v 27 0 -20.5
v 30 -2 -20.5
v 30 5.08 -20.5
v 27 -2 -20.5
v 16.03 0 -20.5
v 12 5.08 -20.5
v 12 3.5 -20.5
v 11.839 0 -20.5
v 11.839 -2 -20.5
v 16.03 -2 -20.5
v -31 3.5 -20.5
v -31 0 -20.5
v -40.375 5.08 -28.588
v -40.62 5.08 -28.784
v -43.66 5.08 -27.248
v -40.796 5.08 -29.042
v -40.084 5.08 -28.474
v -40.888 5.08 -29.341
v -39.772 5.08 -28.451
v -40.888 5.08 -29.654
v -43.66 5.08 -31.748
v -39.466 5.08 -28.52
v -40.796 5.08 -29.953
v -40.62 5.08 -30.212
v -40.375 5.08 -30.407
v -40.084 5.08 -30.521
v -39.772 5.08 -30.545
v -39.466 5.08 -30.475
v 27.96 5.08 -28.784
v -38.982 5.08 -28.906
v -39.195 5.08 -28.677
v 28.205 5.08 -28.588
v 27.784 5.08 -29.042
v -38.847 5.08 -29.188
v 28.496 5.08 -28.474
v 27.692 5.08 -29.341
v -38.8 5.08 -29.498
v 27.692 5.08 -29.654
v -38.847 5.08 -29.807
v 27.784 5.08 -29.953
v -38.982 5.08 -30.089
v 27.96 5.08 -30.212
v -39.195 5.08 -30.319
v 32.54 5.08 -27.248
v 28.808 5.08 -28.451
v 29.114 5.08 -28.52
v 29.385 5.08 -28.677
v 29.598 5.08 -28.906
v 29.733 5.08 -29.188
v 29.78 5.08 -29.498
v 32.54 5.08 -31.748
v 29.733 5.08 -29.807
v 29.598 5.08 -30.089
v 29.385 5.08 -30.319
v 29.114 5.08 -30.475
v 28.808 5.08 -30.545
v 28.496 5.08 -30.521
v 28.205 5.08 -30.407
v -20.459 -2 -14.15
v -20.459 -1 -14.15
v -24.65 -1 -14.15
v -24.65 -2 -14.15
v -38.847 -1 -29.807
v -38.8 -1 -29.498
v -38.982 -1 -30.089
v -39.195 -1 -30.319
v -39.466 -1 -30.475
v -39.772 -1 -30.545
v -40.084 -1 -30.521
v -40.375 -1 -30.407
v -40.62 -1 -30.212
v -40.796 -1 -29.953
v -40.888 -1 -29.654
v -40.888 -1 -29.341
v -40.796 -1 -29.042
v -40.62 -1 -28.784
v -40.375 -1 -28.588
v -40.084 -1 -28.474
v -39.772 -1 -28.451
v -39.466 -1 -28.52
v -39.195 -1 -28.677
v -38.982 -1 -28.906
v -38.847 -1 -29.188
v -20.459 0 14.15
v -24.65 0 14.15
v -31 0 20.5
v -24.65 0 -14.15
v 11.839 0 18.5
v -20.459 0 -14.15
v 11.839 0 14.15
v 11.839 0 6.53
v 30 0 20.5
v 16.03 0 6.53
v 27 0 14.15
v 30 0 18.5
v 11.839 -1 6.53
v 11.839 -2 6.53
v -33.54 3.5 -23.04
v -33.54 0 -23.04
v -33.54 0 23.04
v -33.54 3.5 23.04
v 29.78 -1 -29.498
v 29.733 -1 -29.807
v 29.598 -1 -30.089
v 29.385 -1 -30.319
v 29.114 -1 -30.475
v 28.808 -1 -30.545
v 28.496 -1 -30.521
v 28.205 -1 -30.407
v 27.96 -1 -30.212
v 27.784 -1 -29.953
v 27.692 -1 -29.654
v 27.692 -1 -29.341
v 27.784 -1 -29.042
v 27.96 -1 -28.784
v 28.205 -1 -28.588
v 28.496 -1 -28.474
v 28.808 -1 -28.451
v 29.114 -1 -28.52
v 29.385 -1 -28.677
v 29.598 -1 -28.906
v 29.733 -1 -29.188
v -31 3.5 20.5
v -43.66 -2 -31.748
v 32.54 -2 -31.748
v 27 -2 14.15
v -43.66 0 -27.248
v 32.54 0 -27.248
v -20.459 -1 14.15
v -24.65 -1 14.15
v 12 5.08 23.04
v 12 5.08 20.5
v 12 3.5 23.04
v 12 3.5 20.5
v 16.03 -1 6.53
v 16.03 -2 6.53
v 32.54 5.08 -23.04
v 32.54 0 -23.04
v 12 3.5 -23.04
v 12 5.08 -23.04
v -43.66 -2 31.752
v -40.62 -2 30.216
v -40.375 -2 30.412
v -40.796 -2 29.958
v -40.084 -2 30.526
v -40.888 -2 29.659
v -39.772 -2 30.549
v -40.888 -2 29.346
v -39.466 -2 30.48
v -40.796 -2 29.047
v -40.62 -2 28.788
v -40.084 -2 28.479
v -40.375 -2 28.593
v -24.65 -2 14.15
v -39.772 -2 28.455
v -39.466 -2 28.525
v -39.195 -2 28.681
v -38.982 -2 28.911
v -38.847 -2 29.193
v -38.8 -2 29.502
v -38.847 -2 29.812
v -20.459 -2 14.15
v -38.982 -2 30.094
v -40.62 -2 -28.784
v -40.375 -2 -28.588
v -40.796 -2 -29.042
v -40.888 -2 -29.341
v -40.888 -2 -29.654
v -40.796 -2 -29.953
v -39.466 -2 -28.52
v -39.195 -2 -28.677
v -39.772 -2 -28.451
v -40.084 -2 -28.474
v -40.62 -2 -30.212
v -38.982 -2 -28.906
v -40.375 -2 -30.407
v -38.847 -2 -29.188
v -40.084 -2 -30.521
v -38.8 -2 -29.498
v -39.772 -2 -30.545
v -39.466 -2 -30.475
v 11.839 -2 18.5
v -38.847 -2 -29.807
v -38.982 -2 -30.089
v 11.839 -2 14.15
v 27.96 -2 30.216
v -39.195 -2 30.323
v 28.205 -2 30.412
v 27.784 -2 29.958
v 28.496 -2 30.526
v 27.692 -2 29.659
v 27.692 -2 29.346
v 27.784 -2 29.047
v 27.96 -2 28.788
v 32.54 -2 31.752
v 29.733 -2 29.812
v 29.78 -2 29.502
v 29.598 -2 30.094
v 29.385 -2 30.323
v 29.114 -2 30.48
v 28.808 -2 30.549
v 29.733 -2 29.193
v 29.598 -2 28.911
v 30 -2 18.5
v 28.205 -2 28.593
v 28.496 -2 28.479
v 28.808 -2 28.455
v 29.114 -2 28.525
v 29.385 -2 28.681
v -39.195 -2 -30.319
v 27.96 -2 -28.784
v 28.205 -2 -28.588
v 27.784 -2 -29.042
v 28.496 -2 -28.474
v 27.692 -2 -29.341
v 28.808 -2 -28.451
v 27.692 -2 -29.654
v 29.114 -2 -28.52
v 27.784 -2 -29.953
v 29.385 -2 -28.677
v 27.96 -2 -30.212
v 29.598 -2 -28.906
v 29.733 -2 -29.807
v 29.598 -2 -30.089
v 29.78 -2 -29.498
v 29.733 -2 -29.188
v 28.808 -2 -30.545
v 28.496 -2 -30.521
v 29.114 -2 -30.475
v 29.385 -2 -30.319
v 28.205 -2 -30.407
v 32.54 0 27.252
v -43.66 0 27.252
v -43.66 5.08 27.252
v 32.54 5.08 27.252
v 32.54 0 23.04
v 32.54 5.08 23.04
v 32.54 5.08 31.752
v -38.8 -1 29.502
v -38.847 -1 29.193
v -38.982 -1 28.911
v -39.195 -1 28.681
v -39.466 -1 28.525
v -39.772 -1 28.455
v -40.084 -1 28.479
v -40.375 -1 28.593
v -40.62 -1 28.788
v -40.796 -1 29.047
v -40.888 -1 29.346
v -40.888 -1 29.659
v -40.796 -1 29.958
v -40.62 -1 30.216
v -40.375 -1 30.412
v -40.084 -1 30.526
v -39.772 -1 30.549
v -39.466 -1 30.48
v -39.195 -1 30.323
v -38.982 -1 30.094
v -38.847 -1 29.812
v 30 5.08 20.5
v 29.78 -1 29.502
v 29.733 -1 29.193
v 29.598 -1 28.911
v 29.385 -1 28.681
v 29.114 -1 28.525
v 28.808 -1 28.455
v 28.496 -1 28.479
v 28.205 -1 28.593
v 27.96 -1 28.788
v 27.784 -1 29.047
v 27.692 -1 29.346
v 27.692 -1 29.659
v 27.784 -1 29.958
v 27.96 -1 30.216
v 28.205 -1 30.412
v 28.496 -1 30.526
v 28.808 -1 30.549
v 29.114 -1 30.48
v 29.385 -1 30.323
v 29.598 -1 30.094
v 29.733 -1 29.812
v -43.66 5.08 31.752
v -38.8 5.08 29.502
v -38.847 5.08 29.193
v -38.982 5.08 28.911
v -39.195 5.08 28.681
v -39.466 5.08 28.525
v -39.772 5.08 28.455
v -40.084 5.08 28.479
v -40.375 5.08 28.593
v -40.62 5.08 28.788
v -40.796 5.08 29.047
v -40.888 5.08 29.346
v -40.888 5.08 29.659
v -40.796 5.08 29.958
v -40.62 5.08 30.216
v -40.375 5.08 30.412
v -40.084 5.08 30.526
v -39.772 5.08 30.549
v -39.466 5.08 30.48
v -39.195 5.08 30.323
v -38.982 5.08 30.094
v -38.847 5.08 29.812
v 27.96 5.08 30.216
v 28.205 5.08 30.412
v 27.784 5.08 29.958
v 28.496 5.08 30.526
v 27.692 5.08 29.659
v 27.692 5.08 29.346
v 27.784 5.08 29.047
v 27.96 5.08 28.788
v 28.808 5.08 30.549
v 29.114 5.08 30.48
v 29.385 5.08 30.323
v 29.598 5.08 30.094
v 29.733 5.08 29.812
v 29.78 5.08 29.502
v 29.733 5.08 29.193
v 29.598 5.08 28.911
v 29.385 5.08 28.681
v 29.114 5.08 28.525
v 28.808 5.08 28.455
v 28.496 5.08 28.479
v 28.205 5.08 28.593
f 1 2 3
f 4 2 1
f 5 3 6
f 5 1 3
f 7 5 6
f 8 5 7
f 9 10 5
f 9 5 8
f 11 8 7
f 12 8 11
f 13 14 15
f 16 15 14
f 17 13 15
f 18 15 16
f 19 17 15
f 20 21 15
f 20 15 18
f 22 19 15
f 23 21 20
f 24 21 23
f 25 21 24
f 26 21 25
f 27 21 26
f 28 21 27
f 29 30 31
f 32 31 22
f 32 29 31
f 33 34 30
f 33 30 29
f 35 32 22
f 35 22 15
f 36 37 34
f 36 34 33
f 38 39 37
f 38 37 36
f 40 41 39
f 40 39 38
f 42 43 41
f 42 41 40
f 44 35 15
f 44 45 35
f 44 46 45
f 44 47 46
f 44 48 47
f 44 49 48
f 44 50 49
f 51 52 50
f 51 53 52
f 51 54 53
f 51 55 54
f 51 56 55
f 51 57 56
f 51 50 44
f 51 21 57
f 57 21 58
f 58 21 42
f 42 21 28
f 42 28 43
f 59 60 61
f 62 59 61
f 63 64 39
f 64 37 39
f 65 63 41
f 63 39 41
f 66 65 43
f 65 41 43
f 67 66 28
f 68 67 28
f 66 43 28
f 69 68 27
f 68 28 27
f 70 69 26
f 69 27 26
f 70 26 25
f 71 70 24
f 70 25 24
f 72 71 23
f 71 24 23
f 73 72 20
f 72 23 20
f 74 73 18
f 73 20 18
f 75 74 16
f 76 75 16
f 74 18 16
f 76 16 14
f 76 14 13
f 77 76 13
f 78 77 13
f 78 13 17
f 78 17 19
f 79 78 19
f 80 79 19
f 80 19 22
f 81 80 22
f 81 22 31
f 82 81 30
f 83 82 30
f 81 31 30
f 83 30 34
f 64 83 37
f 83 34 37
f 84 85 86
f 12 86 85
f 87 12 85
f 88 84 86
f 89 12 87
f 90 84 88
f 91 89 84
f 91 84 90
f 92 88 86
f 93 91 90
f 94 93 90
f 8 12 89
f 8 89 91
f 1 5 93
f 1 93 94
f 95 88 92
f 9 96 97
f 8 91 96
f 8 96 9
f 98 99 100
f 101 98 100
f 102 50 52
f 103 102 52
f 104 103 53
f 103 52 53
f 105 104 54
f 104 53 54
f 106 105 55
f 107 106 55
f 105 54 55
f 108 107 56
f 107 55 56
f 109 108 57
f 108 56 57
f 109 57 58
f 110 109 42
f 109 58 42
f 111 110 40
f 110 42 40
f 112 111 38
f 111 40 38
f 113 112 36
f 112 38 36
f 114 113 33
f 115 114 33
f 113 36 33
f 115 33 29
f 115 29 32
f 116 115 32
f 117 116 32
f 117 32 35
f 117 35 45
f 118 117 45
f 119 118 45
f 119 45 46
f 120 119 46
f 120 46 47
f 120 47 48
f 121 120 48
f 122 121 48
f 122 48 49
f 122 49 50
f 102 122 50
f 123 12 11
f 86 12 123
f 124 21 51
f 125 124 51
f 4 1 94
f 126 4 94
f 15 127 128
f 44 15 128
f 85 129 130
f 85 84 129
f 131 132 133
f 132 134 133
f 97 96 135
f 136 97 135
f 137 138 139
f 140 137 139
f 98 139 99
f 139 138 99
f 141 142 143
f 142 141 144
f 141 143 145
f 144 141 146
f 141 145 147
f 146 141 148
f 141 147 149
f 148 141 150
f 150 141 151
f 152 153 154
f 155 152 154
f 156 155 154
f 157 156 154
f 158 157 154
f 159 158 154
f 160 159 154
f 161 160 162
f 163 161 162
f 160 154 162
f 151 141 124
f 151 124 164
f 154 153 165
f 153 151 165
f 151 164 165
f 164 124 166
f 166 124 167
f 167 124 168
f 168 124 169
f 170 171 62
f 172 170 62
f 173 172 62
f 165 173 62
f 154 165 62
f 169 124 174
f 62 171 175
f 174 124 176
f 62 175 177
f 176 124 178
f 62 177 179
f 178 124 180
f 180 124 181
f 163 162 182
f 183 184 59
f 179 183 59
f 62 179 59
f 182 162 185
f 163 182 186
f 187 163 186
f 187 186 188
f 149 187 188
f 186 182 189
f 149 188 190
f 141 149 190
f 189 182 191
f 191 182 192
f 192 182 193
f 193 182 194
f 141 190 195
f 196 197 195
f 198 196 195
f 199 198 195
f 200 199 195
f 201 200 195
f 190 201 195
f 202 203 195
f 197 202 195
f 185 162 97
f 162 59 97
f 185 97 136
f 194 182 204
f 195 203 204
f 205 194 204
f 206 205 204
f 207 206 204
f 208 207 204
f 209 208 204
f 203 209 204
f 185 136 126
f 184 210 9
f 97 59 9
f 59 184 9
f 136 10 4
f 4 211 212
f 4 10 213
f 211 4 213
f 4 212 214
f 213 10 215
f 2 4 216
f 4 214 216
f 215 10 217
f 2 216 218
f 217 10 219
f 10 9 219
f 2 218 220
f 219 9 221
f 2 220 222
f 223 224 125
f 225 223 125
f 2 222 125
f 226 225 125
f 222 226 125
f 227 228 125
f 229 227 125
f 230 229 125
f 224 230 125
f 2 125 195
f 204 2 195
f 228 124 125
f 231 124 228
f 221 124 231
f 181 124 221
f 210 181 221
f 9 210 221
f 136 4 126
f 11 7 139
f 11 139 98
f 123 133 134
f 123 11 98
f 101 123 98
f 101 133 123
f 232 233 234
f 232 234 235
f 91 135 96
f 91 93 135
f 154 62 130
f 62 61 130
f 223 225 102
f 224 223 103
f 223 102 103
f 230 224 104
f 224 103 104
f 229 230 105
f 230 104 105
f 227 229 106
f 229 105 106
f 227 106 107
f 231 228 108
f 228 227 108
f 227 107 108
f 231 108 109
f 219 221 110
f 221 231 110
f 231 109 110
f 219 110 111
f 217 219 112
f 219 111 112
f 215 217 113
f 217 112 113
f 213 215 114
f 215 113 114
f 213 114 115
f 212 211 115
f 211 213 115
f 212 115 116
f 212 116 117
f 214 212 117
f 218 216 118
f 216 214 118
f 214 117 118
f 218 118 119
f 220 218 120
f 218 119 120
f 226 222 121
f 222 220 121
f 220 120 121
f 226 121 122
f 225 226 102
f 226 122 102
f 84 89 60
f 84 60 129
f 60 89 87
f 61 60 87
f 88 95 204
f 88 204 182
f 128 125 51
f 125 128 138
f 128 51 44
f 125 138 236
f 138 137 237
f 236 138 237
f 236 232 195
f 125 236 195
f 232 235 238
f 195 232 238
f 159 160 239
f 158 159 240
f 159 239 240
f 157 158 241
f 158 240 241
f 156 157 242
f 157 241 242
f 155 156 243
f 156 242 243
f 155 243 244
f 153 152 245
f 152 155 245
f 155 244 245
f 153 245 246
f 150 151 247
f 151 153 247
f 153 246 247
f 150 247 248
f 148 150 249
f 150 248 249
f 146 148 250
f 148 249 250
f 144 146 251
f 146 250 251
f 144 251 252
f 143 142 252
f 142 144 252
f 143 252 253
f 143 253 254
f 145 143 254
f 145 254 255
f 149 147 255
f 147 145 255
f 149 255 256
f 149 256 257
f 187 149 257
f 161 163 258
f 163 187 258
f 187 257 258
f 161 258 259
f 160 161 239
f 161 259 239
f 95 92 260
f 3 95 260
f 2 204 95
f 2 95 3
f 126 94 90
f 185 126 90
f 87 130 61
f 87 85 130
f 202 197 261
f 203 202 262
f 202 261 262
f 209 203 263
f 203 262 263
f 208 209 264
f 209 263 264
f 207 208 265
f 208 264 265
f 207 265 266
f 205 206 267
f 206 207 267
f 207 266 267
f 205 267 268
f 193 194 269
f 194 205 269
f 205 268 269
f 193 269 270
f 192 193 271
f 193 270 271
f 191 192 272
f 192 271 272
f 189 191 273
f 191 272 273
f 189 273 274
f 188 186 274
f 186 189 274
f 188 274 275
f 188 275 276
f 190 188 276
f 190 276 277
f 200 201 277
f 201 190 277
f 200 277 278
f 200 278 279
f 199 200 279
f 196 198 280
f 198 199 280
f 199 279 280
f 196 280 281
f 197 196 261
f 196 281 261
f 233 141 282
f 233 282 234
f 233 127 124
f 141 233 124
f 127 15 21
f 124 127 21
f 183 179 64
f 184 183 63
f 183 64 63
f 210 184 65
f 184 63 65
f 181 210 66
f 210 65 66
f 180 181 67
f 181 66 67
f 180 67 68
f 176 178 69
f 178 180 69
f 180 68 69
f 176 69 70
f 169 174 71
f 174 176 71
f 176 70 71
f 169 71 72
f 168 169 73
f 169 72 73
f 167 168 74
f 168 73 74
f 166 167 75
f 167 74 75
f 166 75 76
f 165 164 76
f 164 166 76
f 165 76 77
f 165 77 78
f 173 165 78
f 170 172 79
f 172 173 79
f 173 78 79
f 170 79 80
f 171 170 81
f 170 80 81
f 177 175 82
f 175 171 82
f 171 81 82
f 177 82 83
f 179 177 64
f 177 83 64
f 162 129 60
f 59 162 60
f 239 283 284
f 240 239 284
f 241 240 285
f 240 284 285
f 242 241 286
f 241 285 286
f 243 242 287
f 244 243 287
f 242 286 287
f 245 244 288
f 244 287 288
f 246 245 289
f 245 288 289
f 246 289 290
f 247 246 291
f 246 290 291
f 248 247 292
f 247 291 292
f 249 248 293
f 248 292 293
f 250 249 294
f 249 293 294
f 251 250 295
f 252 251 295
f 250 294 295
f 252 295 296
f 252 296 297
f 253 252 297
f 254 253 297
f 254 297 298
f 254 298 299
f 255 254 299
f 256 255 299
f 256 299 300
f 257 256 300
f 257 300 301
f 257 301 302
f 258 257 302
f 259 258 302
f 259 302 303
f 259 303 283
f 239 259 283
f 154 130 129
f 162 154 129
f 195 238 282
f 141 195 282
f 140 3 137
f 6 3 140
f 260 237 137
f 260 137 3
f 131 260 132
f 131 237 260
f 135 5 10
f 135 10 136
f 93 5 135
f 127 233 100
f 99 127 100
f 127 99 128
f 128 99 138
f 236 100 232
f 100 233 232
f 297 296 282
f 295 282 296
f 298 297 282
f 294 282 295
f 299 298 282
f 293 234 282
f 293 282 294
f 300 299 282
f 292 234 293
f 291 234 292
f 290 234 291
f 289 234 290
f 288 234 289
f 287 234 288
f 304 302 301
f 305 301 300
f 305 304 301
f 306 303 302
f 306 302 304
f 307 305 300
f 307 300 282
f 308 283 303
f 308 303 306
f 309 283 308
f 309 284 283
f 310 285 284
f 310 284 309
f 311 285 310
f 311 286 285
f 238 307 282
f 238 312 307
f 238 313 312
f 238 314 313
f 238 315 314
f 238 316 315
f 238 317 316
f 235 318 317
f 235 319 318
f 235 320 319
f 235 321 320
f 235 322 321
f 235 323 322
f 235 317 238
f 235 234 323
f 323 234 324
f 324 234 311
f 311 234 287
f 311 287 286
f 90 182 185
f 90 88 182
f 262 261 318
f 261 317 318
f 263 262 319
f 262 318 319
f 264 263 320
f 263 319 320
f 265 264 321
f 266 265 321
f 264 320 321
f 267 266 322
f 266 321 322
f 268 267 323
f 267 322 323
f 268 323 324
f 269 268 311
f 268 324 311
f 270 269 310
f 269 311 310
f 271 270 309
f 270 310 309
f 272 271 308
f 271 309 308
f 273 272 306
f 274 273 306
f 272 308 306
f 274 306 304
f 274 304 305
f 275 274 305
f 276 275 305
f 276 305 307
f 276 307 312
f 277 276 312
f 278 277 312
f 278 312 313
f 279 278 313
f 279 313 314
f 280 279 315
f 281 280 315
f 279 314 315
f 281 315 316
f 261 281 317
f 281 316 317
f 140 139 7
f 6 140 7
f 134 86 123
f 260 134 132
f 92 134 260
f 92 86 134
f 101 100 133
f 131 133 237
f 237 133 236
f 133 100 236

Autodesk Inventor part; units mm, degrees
ref_plane "YZ Plane" through (0, 0, 0) normal (1, 0, 0) x (0, 1, 0)
ref_plane "XZ Plane" through (0, 0, 0) normal (0, 1, 0) x (-1, 0, 0)
ref_plane "XY Plane" through (0, 0, 0) normal (0, 0, 1) x (1, 0, 0)
sketch "Sketch1" plane through (0, 0, 0) normal (0, 1, 0) x (-1, 0, 0)
  line L0 (31, 20.5) -> (-30, 20.5)
  line L1 (-30, 20.5) -> (-30, -20.5)
  line L2 (-30, -20.5) -> (31, -20.5)
  line L3 (31, -20.5) -> (31, 20.5)
  line L4 (33.54, 23.04) -> (-32.54, 23.04)
  line L5 (-32.54, 23.04) -> (-32.54, -23.04)
  line L6 (-32.54, -23.04) -> (33.54, -23.04)
  line L7 (33.54, -23.04) -> (33.54, 23.04)
  line L8 (-12, -20.5) -> (-12, 20.5)
  line L9 (-12, -23.04) -> (-12, -20.5)
  line L10 (-12, 20.5) -> (-12, 23.04)
  point P0 (0, 0)
  dimension "d0" = 41
  dimension "d1" = 61
  dimension "d2" = 20.5
  dimension "d3" = 31
  dimension "d4" = 2.54
  dimension "d9" = 18
  dimension "d48" = 46.08
extrude "Extrusion1" add sketch "Sketch1" along normal blind 3.5 contours L0 L10 L4 L7 L6 L9 L2 L3
extrude "Extrusion3" add sketch "Sketch1" along normal blind 5.08 contours L0 L1 L2 L9 L6 L5 L4 L10
sketch "Sketch3" plane through (0, 0, 0) normal (0, -1, 0) x (1, 0, 0)
  line L0 (-31, -20.5) -> (30, -20.5) projected
  line L1 (-31, 20.5) -> (-31, -20.5) projected
  line L2 (30, 20.5) -> (-31, 20.5) projected
  line L3 (30, -20.5) -> (30, 20.5) projected
  line L4 (32.54, -23.04) -> (-33.54, -23.04) projected
  line L5 (32.54, 23.04) -> (32.54, -23.04) projected
  line L6 (-33.54, 23.04) -> (32.54, 23.04) projected
  line L7 (-33.54, -23.04) -> (-33.54, 23.04) projected
  point P0 (0, 0)
extrude "Extrusion4" add sketch "Sketch3" along normal blind 1 contours L1 L2 L3 L0 | L4 L7 L6 L5
sketch "Sketch4" plane through (0, 0, 0) normal (0, 1, 0) x (1, 0, 0)
  line L0 (12, -20.5) -> (-31, -20.5) projected
  line L1 (-31, -20.5) -> (-31, 20.5) projected
  line L2 (30, 20.5) -> (30, -20.5) projected
  line L3 (30, -20.5) -> (12, -20.5) projected
  line L4 (-31, 20.5) -> (12, 20.5) projected
  line L5 (-24.65, 20.5) -> (-20.459, 20.5)
  line L6 (-20.459, 20.5) -> (-20.459, -20.5)
  line L7 (-20.459, -20.5) -> (-24.65, -20.5)
  line L8 (-24.65, -20.5) -> (-24.65, 20.5)
  line L9 (16.03, -20.5) -> (11.839, -20.5)
  line L10 (11.839, -20.5) -> (11.839, 20.5)
  line L11 (11.839, 20.5) -> (16.03, 20.5)
  line L12 (16.03, 20.5) -> (16.03, -20.5)
  point P0 (0, 0)
  point P1 (-24.65, -20.5)
  dimension "d31" = 4.191
  dimension "d37" = 4.191
  dimension "d38" = 13.97
  dimension "d45" = 6.35
extrude "Extrusion5" cut sketch "Sketch4" against normal blind 25.4 contours L0 L10 L4 L11 L12 L3 | L0 L8 L4 L6
sketch "Sketch6" plane through (0, 0, 0) normal (0, 1, 0) x (1, 0, 0)
  line L0 (30, 20.5) -> (-31, 20.5) projected
  line L1 (30, -20.5) -> (16.03, -20.5) projected
  line L2 (30, 20.5) -> (27, 20.5)
  line L3 (27, 20.5) -> (27, -20.5)
  line L4 (27, -20.5) -> (30, -20.5)
  line L5 (30, -20.5) -> (30, 20.5)
  point P0 (0, 0)
  dimension "d33" = 3
extrude "Extrusion7" cut sketch "Sketch6" against normal blind 25.4
sketch "Sketch7" plane through (0, 0, 0) normal (0, 1, 0) x (1, 0, 0)
  line L0 (11.839, -20.5) -> (16.03, -20.5) projected
  line L1 (27, -20.5) -> (27, 20.5) projected
  line L2 (16.03, -20.5) -> (27, -20.5)
  line L3 (27, -20.5) -> (27, -16.69)
  line L4 (27, -16.69) -> (16.03, -16.69)
  line L5 (16.03, -16.69) -> (16.03, -20.5)
  line L6 (27, -20.5) -> (16.03, -20.5) projected
  line L7 (19.6495, -16.69) -> (22.1895, -16.69)
  line L8 (22.1895, -20.5) -> (19.6495, -20.5)
  point P0 (0, 0)
  dimension "d39" = 3.81
  dimension "d41" = 10.97
extrude "Extrusion8" cut sketch "Sketch7" against normal blind 25.4
sketch "Sketch9" plane through (0, -1, 0) normal (0, -1, 0) x (1, 0, 0)
  line L0 (32.54, 31.7522) -> (-43.66, 31.7522)
  line L1 (-43.66, 31.7522) -> (-43.66, -31.7478)
  line L2 (-43.66, -31.7478) -> (32.54, -31.7478)
  line L3 (32.54, -31.7478) -> (32.54, 31.7522)
  line L4 (32.54, -23.04) -> (32.54, 23.04) projected
  line L5 (-33.54, 23.04) -> (-33.54, -23.04) projected
  line L6 (27, 16.69) -> (16.03, 16.69) projected
  line L7 (16.03, 16.69) -> (16.03, -20.5) projected
  line L8 (16.03, -20.5) -> (11.839, -20.5) projected
  line L9 (11.839, -20.5) -> (11.839, 20.5) projected
  line L10 (11.839, 20.5) -> (30, 20.5) projected
  line L11 (30, 20.5) -> (30, -20.5) projected
  line L12 (30, -20.5) -> (27, -20.5) projected
  line L13 (27, -20.5) -> (27, 16.69) projected
  line L14 (-20.459, 20.5) -> (-20.459, -20.5) projected
  line L15 (-20.459, -20.5) -> (-24.65, -20.5) projected
  line L16 (-24.65, -20.5) -> (-24.65, 20.5) projected
  line L17 (-24.65, 20.5) -> (-20.459, 20.5) projected
  line L18 (32.54, 23.04) -> (-33.54, 23.04) projected
  line L19 (-33.54, 23.04) -> (-33.54, -23.04) projected
  line L20 (-33.54, -23.04) -> (32.54, -23.04) projected
  line L21 (32.54, -23.04) -> (32.54, 23.04) projected
  point P0 (0, 0)
  point P1 (-33.54, -23.04)
  dimension "d46" = 0
  dimension "d49" = 8.7122
  dimension "d50" = 63.5
  dimension "d51" = 8.7078
  dimension "d52" = 76.2
extrude "Extrusion9" add sketch "Sketch9" against normal blind 1 contours L3 L18 L5 L20 L2 L1 L0
sketch "Sketch10" plane through (0, 0, 0) normal (0, 1, 0) x (1, 0, 0)
  circle A0 centre (-39.85, 29.4978) radius 1.05
  line L0 (-43.66, 31.7478) -> (-43.66, 27.2478)
  circle A1 centre (-39.85, -29.5022) radius 1.05
  line L1 (-43.66, -27.2522) -> (-43.66, -31.7522)
  circle A2 centre (28.73, 29.4978) radius 1.05
  line L2 (32.54, 27.2478) -> (32.54, 31.7478)
  line L3 (-43.66, 27.2478) -> (32.54, 27.2478)
  circle A3 centre (28.73, -29.5022) radius 1.05
  line L4 (-43.66, -31.7522) -> (32.54, -31.7522)
  line L5 (32.54, -31.7522) -> (32.54, -27.2522)
  line L6 (-43.66, 31.7478) -> (-43.66, -31.7522)
  line L7 (-43.66, -31.7522) -> (32.54, -31.7522)
  line L8 (32.54, 31.7478) -> (32.54, -31.7522)
  line L9 (-43.66, 31.7478) -> (32.54, 31.7478)
  line L10 (-43.66, 31.7478) -> (-43.66, -31.7522) projected
  line L11 (-43.66, -31.7522) -> (32.54, -31.7522) projected
  line L12 (32.54, -31.7522) -> (-43.66, -31.7522)
  line L13 (-43.66, -31.7522) -> (-43.66, -27.2522)
  line L14 (-43.66, -27.2522) -> (32.54, -27.2522)
  line L15 (32.54, -27.2522) -> (32.54, -31.7522)
  point P0 (32.54, -0.0022)
  dimension "d55" = 2.1
  dimension "d56" = 3.81
  dimension "d57" = 2.25
  dimension "d58" = 2.25
  dimension "d59" = 2.1
  dimension "d60" = 3.81
  dimension "d61" = 2.1
  dimension "d62" = 2.1
  dimension "d63" = 3.81
  dimension "d64" = 3.81
  dimension "d65" = 2.25
  dimension "d66" = 2.25
  dimension "d67" = 4.5
  dimension "d68" = 4.5
extrude "Extrusion10" add sketch "Sketch10" along normal blind 5.08 contours L9 L2 L3 L0 | L14 L5 L4 L1
sketch "Sketch11" plane through (0, 5.08, 0) normal (0, 1, 0) x (1, 0, 0)
  line L0 (-43.66, 31.7478) -> (-43.66, 27.2478) projected
  line L1 (-43.66, 27.2478) -> (32.54, 27.2478) projected
  line L2 (32.54, 27.2478) -> (32.54, 31.7478) projected
  line L3 (32.54, 31.7478) -> (-43.66, 31.7478) projected
  circle A0 centre (-39.85, 29.4978) radius 1.05 projected
  circle A1 centre (28.73, 29.4978) radius 1.05 projected
  line L4 (-43.66, -27.2522) -> (-43.66, -31.7522) projected
  line L5 (-43.66, -31.7522) -> (32.54, -31.7522) projected
  line L6 (32.54, -31.7522) -> (32.54, -27.2522) projected
  line L7 (32.54, -27.2522) -> (-43.66, -27.2522) projected
  circle A2 centre (28.73, -29.5022) radius 1.05 projected
  circle A3 centre (-39.85, -29.5022) radius 1.05 projected
  point P0 (0, 0)
extrude "Extrusion11" cut sketch "Sketch11" against normal blind 25.4 contours A0 | A1 | A2 | A3
sketch "Sketch12" plane through (0, 0, 0) normal (0, 1, 0) x (1, 0, 0)
  line L0 (16.03, -16.69) -> (16.03, 20.5) projected
  line L1 (27, 20.5) -> (27, -16.69) projected
  line L2 (16.03, -16.69) -> (27, -16.69)
  line L3 (27, -16.69) -> (27, -14.15)
  line L4 (27, -14.15) -> (16.03, -14.15)
  line L5 (16.03, -14.15) -> (16.03, -16.69)
  line L6 (11.839, 20.5) -> (11.839, -20.5) projected
  line L7 (11.839, -14.15) -> (16.03, -14.15)
  line L8 (16.03, -14.15) -> (16.03, -6.53)
  line L9 (16.03, -6.53) -> (11.839, -6.53)
  line L10 (11.839, -6.53) -> (11.839, -14.15)
  line L11 (30, -20.5) -> (12, -20.5) projected
  line L12 (-24.65, -20.5) -> (-24.65, 20.5) projected
  line L13 (-20.459, -20.5) -> (-20.459, 20.5) projected
  line L14 (-24.65, -20.5) -> (-20.459, -20.5)
  line L15 (-20.459, -20.5) -> (-20.459, -14.15)
  line L16 (-20.459, -14.15) -> (-24.65, -14.15)
  line L17 (-24.65, -14.15) -> (-24.65, -20.5)
  line L18 (-24.65, 20.5) -> (-20.459, 20.5)
  line L19 (-20.459, 20.5) -> (-20.459, 14.15)
  line L20 (-20.459, 14.15) -> (-24.65, 14.15)
  line L21 (-24.65, 14.15) -> (-24.65, 20.5)
  point P0 (0, 0)
  point P1 (27, -16.69)
  point P2 (11.839, -6.53)
  point P3 (21, -20.5)
  point P4 (13.9345, -14.15)
  dimension "d78" = 2.54
  dimension "d79" = 0
  dimension "d80" = 7.62
  dimension "d81" = 6.35
  dimension "d82" = 6.35
extrude "Extrusion12" cut sketch "Sketch12" against normal blind 25.4 contours L0 L4 L1 L2
extrude "Extrusion13" add sketch "Sketch12" against normal blind 1 contours L7 L6 L9 L0 | L12 L16 L13 L14 | L12 L18 L13 L20
sketch "Sketch13" plane through (0, -1, 0) normal (0, -1, 0) x (1, 0, 0)
  line L0 (11.839, 20.5) -> (-31, 20.5) projected
  line L1 (16.03, 6.53) -> (16.03, -20.5) projected
  line L2 (16.03, -20.5) -> (11.839, -20.5) projected
  line L3 (11.839, -20.5) -> (11.839, 6.53) projected
  line L4 (11.839, 6.53) -> (16.03, 6.53) projected
  line L5 (32.54, -31.7478) -> (32.54, 31.7522) projected
  line L6 (32.54, 31.7522) -> (-43.66, 31.7522) projected
  line L7 (-43.66, 31.7522) -> (-43.66, -31.7478) projected
  line L8 (-43.66, -31.7478) -> (32.54, -31.7478) projected
  line L9 (-20.459, 14.15) -> (-20.459, -14.15) projected
  line L10 (-20.459, -14.15) -> (-24.65, -14.15) projected
  line L11 (-24.65, -14.15) -> (-24.65, 14.15) projected
  line L12 (-24.65, 14.15) -> (-20.459, 14.15) projected
  line L13 (27, 14.15) -> (11.839, 14.15) projected
  line L14 (11.839, 14.15) -> (11.839, 20.5) projected
  line L15 (11.839, 20.5) -> (30, 20.5) projected
  line L16 (30, 20.5) -> (30, -20.5) projected
  line L17 (30, -20.5) -> (27, -20.5) projected
  line L18 (27, -20.5) -> (27, 14.15) projected
  circle A0 centre (28.73, 29.5022) radius 1.05 projected
  circle A1 centre (28.73, -29.4978) radius 1.05 projected
  circle A2 centre (-39.85, 29.5022) radius 1.05 projected
  circle A3 centre (-39.85, -29.4978) radius 1.05 projected
  point P0 (0, 0)
extrude "Extrusion14" add sketch "Sketch13" along normal blind 1
sketch "Sketch14" plane through (0, 0, 0) normal (0, 1, 0) x (1, 0, 0)
  line L0 (11.839, -14.15) -> (11.839, -20.5) projected
  line L1 (30, -20.5) -> (30, 20.5) projected
  line L2 (11.839, -20.5) -> (30, -20.5)
  line L3 (30, -20.5) -> (30, -18.5)
  line L4 (30, -18.5) -> (11.839, -18.5)
  line L5 (11.839, -18.5) -> (11.839, -20.5)
  point P0 (0, 0)
  dimension "d86" = 2
extrude "Extrusion15" add sketch "Sketch14" against normal blind 2
properties part number "RFID_Bottom"
